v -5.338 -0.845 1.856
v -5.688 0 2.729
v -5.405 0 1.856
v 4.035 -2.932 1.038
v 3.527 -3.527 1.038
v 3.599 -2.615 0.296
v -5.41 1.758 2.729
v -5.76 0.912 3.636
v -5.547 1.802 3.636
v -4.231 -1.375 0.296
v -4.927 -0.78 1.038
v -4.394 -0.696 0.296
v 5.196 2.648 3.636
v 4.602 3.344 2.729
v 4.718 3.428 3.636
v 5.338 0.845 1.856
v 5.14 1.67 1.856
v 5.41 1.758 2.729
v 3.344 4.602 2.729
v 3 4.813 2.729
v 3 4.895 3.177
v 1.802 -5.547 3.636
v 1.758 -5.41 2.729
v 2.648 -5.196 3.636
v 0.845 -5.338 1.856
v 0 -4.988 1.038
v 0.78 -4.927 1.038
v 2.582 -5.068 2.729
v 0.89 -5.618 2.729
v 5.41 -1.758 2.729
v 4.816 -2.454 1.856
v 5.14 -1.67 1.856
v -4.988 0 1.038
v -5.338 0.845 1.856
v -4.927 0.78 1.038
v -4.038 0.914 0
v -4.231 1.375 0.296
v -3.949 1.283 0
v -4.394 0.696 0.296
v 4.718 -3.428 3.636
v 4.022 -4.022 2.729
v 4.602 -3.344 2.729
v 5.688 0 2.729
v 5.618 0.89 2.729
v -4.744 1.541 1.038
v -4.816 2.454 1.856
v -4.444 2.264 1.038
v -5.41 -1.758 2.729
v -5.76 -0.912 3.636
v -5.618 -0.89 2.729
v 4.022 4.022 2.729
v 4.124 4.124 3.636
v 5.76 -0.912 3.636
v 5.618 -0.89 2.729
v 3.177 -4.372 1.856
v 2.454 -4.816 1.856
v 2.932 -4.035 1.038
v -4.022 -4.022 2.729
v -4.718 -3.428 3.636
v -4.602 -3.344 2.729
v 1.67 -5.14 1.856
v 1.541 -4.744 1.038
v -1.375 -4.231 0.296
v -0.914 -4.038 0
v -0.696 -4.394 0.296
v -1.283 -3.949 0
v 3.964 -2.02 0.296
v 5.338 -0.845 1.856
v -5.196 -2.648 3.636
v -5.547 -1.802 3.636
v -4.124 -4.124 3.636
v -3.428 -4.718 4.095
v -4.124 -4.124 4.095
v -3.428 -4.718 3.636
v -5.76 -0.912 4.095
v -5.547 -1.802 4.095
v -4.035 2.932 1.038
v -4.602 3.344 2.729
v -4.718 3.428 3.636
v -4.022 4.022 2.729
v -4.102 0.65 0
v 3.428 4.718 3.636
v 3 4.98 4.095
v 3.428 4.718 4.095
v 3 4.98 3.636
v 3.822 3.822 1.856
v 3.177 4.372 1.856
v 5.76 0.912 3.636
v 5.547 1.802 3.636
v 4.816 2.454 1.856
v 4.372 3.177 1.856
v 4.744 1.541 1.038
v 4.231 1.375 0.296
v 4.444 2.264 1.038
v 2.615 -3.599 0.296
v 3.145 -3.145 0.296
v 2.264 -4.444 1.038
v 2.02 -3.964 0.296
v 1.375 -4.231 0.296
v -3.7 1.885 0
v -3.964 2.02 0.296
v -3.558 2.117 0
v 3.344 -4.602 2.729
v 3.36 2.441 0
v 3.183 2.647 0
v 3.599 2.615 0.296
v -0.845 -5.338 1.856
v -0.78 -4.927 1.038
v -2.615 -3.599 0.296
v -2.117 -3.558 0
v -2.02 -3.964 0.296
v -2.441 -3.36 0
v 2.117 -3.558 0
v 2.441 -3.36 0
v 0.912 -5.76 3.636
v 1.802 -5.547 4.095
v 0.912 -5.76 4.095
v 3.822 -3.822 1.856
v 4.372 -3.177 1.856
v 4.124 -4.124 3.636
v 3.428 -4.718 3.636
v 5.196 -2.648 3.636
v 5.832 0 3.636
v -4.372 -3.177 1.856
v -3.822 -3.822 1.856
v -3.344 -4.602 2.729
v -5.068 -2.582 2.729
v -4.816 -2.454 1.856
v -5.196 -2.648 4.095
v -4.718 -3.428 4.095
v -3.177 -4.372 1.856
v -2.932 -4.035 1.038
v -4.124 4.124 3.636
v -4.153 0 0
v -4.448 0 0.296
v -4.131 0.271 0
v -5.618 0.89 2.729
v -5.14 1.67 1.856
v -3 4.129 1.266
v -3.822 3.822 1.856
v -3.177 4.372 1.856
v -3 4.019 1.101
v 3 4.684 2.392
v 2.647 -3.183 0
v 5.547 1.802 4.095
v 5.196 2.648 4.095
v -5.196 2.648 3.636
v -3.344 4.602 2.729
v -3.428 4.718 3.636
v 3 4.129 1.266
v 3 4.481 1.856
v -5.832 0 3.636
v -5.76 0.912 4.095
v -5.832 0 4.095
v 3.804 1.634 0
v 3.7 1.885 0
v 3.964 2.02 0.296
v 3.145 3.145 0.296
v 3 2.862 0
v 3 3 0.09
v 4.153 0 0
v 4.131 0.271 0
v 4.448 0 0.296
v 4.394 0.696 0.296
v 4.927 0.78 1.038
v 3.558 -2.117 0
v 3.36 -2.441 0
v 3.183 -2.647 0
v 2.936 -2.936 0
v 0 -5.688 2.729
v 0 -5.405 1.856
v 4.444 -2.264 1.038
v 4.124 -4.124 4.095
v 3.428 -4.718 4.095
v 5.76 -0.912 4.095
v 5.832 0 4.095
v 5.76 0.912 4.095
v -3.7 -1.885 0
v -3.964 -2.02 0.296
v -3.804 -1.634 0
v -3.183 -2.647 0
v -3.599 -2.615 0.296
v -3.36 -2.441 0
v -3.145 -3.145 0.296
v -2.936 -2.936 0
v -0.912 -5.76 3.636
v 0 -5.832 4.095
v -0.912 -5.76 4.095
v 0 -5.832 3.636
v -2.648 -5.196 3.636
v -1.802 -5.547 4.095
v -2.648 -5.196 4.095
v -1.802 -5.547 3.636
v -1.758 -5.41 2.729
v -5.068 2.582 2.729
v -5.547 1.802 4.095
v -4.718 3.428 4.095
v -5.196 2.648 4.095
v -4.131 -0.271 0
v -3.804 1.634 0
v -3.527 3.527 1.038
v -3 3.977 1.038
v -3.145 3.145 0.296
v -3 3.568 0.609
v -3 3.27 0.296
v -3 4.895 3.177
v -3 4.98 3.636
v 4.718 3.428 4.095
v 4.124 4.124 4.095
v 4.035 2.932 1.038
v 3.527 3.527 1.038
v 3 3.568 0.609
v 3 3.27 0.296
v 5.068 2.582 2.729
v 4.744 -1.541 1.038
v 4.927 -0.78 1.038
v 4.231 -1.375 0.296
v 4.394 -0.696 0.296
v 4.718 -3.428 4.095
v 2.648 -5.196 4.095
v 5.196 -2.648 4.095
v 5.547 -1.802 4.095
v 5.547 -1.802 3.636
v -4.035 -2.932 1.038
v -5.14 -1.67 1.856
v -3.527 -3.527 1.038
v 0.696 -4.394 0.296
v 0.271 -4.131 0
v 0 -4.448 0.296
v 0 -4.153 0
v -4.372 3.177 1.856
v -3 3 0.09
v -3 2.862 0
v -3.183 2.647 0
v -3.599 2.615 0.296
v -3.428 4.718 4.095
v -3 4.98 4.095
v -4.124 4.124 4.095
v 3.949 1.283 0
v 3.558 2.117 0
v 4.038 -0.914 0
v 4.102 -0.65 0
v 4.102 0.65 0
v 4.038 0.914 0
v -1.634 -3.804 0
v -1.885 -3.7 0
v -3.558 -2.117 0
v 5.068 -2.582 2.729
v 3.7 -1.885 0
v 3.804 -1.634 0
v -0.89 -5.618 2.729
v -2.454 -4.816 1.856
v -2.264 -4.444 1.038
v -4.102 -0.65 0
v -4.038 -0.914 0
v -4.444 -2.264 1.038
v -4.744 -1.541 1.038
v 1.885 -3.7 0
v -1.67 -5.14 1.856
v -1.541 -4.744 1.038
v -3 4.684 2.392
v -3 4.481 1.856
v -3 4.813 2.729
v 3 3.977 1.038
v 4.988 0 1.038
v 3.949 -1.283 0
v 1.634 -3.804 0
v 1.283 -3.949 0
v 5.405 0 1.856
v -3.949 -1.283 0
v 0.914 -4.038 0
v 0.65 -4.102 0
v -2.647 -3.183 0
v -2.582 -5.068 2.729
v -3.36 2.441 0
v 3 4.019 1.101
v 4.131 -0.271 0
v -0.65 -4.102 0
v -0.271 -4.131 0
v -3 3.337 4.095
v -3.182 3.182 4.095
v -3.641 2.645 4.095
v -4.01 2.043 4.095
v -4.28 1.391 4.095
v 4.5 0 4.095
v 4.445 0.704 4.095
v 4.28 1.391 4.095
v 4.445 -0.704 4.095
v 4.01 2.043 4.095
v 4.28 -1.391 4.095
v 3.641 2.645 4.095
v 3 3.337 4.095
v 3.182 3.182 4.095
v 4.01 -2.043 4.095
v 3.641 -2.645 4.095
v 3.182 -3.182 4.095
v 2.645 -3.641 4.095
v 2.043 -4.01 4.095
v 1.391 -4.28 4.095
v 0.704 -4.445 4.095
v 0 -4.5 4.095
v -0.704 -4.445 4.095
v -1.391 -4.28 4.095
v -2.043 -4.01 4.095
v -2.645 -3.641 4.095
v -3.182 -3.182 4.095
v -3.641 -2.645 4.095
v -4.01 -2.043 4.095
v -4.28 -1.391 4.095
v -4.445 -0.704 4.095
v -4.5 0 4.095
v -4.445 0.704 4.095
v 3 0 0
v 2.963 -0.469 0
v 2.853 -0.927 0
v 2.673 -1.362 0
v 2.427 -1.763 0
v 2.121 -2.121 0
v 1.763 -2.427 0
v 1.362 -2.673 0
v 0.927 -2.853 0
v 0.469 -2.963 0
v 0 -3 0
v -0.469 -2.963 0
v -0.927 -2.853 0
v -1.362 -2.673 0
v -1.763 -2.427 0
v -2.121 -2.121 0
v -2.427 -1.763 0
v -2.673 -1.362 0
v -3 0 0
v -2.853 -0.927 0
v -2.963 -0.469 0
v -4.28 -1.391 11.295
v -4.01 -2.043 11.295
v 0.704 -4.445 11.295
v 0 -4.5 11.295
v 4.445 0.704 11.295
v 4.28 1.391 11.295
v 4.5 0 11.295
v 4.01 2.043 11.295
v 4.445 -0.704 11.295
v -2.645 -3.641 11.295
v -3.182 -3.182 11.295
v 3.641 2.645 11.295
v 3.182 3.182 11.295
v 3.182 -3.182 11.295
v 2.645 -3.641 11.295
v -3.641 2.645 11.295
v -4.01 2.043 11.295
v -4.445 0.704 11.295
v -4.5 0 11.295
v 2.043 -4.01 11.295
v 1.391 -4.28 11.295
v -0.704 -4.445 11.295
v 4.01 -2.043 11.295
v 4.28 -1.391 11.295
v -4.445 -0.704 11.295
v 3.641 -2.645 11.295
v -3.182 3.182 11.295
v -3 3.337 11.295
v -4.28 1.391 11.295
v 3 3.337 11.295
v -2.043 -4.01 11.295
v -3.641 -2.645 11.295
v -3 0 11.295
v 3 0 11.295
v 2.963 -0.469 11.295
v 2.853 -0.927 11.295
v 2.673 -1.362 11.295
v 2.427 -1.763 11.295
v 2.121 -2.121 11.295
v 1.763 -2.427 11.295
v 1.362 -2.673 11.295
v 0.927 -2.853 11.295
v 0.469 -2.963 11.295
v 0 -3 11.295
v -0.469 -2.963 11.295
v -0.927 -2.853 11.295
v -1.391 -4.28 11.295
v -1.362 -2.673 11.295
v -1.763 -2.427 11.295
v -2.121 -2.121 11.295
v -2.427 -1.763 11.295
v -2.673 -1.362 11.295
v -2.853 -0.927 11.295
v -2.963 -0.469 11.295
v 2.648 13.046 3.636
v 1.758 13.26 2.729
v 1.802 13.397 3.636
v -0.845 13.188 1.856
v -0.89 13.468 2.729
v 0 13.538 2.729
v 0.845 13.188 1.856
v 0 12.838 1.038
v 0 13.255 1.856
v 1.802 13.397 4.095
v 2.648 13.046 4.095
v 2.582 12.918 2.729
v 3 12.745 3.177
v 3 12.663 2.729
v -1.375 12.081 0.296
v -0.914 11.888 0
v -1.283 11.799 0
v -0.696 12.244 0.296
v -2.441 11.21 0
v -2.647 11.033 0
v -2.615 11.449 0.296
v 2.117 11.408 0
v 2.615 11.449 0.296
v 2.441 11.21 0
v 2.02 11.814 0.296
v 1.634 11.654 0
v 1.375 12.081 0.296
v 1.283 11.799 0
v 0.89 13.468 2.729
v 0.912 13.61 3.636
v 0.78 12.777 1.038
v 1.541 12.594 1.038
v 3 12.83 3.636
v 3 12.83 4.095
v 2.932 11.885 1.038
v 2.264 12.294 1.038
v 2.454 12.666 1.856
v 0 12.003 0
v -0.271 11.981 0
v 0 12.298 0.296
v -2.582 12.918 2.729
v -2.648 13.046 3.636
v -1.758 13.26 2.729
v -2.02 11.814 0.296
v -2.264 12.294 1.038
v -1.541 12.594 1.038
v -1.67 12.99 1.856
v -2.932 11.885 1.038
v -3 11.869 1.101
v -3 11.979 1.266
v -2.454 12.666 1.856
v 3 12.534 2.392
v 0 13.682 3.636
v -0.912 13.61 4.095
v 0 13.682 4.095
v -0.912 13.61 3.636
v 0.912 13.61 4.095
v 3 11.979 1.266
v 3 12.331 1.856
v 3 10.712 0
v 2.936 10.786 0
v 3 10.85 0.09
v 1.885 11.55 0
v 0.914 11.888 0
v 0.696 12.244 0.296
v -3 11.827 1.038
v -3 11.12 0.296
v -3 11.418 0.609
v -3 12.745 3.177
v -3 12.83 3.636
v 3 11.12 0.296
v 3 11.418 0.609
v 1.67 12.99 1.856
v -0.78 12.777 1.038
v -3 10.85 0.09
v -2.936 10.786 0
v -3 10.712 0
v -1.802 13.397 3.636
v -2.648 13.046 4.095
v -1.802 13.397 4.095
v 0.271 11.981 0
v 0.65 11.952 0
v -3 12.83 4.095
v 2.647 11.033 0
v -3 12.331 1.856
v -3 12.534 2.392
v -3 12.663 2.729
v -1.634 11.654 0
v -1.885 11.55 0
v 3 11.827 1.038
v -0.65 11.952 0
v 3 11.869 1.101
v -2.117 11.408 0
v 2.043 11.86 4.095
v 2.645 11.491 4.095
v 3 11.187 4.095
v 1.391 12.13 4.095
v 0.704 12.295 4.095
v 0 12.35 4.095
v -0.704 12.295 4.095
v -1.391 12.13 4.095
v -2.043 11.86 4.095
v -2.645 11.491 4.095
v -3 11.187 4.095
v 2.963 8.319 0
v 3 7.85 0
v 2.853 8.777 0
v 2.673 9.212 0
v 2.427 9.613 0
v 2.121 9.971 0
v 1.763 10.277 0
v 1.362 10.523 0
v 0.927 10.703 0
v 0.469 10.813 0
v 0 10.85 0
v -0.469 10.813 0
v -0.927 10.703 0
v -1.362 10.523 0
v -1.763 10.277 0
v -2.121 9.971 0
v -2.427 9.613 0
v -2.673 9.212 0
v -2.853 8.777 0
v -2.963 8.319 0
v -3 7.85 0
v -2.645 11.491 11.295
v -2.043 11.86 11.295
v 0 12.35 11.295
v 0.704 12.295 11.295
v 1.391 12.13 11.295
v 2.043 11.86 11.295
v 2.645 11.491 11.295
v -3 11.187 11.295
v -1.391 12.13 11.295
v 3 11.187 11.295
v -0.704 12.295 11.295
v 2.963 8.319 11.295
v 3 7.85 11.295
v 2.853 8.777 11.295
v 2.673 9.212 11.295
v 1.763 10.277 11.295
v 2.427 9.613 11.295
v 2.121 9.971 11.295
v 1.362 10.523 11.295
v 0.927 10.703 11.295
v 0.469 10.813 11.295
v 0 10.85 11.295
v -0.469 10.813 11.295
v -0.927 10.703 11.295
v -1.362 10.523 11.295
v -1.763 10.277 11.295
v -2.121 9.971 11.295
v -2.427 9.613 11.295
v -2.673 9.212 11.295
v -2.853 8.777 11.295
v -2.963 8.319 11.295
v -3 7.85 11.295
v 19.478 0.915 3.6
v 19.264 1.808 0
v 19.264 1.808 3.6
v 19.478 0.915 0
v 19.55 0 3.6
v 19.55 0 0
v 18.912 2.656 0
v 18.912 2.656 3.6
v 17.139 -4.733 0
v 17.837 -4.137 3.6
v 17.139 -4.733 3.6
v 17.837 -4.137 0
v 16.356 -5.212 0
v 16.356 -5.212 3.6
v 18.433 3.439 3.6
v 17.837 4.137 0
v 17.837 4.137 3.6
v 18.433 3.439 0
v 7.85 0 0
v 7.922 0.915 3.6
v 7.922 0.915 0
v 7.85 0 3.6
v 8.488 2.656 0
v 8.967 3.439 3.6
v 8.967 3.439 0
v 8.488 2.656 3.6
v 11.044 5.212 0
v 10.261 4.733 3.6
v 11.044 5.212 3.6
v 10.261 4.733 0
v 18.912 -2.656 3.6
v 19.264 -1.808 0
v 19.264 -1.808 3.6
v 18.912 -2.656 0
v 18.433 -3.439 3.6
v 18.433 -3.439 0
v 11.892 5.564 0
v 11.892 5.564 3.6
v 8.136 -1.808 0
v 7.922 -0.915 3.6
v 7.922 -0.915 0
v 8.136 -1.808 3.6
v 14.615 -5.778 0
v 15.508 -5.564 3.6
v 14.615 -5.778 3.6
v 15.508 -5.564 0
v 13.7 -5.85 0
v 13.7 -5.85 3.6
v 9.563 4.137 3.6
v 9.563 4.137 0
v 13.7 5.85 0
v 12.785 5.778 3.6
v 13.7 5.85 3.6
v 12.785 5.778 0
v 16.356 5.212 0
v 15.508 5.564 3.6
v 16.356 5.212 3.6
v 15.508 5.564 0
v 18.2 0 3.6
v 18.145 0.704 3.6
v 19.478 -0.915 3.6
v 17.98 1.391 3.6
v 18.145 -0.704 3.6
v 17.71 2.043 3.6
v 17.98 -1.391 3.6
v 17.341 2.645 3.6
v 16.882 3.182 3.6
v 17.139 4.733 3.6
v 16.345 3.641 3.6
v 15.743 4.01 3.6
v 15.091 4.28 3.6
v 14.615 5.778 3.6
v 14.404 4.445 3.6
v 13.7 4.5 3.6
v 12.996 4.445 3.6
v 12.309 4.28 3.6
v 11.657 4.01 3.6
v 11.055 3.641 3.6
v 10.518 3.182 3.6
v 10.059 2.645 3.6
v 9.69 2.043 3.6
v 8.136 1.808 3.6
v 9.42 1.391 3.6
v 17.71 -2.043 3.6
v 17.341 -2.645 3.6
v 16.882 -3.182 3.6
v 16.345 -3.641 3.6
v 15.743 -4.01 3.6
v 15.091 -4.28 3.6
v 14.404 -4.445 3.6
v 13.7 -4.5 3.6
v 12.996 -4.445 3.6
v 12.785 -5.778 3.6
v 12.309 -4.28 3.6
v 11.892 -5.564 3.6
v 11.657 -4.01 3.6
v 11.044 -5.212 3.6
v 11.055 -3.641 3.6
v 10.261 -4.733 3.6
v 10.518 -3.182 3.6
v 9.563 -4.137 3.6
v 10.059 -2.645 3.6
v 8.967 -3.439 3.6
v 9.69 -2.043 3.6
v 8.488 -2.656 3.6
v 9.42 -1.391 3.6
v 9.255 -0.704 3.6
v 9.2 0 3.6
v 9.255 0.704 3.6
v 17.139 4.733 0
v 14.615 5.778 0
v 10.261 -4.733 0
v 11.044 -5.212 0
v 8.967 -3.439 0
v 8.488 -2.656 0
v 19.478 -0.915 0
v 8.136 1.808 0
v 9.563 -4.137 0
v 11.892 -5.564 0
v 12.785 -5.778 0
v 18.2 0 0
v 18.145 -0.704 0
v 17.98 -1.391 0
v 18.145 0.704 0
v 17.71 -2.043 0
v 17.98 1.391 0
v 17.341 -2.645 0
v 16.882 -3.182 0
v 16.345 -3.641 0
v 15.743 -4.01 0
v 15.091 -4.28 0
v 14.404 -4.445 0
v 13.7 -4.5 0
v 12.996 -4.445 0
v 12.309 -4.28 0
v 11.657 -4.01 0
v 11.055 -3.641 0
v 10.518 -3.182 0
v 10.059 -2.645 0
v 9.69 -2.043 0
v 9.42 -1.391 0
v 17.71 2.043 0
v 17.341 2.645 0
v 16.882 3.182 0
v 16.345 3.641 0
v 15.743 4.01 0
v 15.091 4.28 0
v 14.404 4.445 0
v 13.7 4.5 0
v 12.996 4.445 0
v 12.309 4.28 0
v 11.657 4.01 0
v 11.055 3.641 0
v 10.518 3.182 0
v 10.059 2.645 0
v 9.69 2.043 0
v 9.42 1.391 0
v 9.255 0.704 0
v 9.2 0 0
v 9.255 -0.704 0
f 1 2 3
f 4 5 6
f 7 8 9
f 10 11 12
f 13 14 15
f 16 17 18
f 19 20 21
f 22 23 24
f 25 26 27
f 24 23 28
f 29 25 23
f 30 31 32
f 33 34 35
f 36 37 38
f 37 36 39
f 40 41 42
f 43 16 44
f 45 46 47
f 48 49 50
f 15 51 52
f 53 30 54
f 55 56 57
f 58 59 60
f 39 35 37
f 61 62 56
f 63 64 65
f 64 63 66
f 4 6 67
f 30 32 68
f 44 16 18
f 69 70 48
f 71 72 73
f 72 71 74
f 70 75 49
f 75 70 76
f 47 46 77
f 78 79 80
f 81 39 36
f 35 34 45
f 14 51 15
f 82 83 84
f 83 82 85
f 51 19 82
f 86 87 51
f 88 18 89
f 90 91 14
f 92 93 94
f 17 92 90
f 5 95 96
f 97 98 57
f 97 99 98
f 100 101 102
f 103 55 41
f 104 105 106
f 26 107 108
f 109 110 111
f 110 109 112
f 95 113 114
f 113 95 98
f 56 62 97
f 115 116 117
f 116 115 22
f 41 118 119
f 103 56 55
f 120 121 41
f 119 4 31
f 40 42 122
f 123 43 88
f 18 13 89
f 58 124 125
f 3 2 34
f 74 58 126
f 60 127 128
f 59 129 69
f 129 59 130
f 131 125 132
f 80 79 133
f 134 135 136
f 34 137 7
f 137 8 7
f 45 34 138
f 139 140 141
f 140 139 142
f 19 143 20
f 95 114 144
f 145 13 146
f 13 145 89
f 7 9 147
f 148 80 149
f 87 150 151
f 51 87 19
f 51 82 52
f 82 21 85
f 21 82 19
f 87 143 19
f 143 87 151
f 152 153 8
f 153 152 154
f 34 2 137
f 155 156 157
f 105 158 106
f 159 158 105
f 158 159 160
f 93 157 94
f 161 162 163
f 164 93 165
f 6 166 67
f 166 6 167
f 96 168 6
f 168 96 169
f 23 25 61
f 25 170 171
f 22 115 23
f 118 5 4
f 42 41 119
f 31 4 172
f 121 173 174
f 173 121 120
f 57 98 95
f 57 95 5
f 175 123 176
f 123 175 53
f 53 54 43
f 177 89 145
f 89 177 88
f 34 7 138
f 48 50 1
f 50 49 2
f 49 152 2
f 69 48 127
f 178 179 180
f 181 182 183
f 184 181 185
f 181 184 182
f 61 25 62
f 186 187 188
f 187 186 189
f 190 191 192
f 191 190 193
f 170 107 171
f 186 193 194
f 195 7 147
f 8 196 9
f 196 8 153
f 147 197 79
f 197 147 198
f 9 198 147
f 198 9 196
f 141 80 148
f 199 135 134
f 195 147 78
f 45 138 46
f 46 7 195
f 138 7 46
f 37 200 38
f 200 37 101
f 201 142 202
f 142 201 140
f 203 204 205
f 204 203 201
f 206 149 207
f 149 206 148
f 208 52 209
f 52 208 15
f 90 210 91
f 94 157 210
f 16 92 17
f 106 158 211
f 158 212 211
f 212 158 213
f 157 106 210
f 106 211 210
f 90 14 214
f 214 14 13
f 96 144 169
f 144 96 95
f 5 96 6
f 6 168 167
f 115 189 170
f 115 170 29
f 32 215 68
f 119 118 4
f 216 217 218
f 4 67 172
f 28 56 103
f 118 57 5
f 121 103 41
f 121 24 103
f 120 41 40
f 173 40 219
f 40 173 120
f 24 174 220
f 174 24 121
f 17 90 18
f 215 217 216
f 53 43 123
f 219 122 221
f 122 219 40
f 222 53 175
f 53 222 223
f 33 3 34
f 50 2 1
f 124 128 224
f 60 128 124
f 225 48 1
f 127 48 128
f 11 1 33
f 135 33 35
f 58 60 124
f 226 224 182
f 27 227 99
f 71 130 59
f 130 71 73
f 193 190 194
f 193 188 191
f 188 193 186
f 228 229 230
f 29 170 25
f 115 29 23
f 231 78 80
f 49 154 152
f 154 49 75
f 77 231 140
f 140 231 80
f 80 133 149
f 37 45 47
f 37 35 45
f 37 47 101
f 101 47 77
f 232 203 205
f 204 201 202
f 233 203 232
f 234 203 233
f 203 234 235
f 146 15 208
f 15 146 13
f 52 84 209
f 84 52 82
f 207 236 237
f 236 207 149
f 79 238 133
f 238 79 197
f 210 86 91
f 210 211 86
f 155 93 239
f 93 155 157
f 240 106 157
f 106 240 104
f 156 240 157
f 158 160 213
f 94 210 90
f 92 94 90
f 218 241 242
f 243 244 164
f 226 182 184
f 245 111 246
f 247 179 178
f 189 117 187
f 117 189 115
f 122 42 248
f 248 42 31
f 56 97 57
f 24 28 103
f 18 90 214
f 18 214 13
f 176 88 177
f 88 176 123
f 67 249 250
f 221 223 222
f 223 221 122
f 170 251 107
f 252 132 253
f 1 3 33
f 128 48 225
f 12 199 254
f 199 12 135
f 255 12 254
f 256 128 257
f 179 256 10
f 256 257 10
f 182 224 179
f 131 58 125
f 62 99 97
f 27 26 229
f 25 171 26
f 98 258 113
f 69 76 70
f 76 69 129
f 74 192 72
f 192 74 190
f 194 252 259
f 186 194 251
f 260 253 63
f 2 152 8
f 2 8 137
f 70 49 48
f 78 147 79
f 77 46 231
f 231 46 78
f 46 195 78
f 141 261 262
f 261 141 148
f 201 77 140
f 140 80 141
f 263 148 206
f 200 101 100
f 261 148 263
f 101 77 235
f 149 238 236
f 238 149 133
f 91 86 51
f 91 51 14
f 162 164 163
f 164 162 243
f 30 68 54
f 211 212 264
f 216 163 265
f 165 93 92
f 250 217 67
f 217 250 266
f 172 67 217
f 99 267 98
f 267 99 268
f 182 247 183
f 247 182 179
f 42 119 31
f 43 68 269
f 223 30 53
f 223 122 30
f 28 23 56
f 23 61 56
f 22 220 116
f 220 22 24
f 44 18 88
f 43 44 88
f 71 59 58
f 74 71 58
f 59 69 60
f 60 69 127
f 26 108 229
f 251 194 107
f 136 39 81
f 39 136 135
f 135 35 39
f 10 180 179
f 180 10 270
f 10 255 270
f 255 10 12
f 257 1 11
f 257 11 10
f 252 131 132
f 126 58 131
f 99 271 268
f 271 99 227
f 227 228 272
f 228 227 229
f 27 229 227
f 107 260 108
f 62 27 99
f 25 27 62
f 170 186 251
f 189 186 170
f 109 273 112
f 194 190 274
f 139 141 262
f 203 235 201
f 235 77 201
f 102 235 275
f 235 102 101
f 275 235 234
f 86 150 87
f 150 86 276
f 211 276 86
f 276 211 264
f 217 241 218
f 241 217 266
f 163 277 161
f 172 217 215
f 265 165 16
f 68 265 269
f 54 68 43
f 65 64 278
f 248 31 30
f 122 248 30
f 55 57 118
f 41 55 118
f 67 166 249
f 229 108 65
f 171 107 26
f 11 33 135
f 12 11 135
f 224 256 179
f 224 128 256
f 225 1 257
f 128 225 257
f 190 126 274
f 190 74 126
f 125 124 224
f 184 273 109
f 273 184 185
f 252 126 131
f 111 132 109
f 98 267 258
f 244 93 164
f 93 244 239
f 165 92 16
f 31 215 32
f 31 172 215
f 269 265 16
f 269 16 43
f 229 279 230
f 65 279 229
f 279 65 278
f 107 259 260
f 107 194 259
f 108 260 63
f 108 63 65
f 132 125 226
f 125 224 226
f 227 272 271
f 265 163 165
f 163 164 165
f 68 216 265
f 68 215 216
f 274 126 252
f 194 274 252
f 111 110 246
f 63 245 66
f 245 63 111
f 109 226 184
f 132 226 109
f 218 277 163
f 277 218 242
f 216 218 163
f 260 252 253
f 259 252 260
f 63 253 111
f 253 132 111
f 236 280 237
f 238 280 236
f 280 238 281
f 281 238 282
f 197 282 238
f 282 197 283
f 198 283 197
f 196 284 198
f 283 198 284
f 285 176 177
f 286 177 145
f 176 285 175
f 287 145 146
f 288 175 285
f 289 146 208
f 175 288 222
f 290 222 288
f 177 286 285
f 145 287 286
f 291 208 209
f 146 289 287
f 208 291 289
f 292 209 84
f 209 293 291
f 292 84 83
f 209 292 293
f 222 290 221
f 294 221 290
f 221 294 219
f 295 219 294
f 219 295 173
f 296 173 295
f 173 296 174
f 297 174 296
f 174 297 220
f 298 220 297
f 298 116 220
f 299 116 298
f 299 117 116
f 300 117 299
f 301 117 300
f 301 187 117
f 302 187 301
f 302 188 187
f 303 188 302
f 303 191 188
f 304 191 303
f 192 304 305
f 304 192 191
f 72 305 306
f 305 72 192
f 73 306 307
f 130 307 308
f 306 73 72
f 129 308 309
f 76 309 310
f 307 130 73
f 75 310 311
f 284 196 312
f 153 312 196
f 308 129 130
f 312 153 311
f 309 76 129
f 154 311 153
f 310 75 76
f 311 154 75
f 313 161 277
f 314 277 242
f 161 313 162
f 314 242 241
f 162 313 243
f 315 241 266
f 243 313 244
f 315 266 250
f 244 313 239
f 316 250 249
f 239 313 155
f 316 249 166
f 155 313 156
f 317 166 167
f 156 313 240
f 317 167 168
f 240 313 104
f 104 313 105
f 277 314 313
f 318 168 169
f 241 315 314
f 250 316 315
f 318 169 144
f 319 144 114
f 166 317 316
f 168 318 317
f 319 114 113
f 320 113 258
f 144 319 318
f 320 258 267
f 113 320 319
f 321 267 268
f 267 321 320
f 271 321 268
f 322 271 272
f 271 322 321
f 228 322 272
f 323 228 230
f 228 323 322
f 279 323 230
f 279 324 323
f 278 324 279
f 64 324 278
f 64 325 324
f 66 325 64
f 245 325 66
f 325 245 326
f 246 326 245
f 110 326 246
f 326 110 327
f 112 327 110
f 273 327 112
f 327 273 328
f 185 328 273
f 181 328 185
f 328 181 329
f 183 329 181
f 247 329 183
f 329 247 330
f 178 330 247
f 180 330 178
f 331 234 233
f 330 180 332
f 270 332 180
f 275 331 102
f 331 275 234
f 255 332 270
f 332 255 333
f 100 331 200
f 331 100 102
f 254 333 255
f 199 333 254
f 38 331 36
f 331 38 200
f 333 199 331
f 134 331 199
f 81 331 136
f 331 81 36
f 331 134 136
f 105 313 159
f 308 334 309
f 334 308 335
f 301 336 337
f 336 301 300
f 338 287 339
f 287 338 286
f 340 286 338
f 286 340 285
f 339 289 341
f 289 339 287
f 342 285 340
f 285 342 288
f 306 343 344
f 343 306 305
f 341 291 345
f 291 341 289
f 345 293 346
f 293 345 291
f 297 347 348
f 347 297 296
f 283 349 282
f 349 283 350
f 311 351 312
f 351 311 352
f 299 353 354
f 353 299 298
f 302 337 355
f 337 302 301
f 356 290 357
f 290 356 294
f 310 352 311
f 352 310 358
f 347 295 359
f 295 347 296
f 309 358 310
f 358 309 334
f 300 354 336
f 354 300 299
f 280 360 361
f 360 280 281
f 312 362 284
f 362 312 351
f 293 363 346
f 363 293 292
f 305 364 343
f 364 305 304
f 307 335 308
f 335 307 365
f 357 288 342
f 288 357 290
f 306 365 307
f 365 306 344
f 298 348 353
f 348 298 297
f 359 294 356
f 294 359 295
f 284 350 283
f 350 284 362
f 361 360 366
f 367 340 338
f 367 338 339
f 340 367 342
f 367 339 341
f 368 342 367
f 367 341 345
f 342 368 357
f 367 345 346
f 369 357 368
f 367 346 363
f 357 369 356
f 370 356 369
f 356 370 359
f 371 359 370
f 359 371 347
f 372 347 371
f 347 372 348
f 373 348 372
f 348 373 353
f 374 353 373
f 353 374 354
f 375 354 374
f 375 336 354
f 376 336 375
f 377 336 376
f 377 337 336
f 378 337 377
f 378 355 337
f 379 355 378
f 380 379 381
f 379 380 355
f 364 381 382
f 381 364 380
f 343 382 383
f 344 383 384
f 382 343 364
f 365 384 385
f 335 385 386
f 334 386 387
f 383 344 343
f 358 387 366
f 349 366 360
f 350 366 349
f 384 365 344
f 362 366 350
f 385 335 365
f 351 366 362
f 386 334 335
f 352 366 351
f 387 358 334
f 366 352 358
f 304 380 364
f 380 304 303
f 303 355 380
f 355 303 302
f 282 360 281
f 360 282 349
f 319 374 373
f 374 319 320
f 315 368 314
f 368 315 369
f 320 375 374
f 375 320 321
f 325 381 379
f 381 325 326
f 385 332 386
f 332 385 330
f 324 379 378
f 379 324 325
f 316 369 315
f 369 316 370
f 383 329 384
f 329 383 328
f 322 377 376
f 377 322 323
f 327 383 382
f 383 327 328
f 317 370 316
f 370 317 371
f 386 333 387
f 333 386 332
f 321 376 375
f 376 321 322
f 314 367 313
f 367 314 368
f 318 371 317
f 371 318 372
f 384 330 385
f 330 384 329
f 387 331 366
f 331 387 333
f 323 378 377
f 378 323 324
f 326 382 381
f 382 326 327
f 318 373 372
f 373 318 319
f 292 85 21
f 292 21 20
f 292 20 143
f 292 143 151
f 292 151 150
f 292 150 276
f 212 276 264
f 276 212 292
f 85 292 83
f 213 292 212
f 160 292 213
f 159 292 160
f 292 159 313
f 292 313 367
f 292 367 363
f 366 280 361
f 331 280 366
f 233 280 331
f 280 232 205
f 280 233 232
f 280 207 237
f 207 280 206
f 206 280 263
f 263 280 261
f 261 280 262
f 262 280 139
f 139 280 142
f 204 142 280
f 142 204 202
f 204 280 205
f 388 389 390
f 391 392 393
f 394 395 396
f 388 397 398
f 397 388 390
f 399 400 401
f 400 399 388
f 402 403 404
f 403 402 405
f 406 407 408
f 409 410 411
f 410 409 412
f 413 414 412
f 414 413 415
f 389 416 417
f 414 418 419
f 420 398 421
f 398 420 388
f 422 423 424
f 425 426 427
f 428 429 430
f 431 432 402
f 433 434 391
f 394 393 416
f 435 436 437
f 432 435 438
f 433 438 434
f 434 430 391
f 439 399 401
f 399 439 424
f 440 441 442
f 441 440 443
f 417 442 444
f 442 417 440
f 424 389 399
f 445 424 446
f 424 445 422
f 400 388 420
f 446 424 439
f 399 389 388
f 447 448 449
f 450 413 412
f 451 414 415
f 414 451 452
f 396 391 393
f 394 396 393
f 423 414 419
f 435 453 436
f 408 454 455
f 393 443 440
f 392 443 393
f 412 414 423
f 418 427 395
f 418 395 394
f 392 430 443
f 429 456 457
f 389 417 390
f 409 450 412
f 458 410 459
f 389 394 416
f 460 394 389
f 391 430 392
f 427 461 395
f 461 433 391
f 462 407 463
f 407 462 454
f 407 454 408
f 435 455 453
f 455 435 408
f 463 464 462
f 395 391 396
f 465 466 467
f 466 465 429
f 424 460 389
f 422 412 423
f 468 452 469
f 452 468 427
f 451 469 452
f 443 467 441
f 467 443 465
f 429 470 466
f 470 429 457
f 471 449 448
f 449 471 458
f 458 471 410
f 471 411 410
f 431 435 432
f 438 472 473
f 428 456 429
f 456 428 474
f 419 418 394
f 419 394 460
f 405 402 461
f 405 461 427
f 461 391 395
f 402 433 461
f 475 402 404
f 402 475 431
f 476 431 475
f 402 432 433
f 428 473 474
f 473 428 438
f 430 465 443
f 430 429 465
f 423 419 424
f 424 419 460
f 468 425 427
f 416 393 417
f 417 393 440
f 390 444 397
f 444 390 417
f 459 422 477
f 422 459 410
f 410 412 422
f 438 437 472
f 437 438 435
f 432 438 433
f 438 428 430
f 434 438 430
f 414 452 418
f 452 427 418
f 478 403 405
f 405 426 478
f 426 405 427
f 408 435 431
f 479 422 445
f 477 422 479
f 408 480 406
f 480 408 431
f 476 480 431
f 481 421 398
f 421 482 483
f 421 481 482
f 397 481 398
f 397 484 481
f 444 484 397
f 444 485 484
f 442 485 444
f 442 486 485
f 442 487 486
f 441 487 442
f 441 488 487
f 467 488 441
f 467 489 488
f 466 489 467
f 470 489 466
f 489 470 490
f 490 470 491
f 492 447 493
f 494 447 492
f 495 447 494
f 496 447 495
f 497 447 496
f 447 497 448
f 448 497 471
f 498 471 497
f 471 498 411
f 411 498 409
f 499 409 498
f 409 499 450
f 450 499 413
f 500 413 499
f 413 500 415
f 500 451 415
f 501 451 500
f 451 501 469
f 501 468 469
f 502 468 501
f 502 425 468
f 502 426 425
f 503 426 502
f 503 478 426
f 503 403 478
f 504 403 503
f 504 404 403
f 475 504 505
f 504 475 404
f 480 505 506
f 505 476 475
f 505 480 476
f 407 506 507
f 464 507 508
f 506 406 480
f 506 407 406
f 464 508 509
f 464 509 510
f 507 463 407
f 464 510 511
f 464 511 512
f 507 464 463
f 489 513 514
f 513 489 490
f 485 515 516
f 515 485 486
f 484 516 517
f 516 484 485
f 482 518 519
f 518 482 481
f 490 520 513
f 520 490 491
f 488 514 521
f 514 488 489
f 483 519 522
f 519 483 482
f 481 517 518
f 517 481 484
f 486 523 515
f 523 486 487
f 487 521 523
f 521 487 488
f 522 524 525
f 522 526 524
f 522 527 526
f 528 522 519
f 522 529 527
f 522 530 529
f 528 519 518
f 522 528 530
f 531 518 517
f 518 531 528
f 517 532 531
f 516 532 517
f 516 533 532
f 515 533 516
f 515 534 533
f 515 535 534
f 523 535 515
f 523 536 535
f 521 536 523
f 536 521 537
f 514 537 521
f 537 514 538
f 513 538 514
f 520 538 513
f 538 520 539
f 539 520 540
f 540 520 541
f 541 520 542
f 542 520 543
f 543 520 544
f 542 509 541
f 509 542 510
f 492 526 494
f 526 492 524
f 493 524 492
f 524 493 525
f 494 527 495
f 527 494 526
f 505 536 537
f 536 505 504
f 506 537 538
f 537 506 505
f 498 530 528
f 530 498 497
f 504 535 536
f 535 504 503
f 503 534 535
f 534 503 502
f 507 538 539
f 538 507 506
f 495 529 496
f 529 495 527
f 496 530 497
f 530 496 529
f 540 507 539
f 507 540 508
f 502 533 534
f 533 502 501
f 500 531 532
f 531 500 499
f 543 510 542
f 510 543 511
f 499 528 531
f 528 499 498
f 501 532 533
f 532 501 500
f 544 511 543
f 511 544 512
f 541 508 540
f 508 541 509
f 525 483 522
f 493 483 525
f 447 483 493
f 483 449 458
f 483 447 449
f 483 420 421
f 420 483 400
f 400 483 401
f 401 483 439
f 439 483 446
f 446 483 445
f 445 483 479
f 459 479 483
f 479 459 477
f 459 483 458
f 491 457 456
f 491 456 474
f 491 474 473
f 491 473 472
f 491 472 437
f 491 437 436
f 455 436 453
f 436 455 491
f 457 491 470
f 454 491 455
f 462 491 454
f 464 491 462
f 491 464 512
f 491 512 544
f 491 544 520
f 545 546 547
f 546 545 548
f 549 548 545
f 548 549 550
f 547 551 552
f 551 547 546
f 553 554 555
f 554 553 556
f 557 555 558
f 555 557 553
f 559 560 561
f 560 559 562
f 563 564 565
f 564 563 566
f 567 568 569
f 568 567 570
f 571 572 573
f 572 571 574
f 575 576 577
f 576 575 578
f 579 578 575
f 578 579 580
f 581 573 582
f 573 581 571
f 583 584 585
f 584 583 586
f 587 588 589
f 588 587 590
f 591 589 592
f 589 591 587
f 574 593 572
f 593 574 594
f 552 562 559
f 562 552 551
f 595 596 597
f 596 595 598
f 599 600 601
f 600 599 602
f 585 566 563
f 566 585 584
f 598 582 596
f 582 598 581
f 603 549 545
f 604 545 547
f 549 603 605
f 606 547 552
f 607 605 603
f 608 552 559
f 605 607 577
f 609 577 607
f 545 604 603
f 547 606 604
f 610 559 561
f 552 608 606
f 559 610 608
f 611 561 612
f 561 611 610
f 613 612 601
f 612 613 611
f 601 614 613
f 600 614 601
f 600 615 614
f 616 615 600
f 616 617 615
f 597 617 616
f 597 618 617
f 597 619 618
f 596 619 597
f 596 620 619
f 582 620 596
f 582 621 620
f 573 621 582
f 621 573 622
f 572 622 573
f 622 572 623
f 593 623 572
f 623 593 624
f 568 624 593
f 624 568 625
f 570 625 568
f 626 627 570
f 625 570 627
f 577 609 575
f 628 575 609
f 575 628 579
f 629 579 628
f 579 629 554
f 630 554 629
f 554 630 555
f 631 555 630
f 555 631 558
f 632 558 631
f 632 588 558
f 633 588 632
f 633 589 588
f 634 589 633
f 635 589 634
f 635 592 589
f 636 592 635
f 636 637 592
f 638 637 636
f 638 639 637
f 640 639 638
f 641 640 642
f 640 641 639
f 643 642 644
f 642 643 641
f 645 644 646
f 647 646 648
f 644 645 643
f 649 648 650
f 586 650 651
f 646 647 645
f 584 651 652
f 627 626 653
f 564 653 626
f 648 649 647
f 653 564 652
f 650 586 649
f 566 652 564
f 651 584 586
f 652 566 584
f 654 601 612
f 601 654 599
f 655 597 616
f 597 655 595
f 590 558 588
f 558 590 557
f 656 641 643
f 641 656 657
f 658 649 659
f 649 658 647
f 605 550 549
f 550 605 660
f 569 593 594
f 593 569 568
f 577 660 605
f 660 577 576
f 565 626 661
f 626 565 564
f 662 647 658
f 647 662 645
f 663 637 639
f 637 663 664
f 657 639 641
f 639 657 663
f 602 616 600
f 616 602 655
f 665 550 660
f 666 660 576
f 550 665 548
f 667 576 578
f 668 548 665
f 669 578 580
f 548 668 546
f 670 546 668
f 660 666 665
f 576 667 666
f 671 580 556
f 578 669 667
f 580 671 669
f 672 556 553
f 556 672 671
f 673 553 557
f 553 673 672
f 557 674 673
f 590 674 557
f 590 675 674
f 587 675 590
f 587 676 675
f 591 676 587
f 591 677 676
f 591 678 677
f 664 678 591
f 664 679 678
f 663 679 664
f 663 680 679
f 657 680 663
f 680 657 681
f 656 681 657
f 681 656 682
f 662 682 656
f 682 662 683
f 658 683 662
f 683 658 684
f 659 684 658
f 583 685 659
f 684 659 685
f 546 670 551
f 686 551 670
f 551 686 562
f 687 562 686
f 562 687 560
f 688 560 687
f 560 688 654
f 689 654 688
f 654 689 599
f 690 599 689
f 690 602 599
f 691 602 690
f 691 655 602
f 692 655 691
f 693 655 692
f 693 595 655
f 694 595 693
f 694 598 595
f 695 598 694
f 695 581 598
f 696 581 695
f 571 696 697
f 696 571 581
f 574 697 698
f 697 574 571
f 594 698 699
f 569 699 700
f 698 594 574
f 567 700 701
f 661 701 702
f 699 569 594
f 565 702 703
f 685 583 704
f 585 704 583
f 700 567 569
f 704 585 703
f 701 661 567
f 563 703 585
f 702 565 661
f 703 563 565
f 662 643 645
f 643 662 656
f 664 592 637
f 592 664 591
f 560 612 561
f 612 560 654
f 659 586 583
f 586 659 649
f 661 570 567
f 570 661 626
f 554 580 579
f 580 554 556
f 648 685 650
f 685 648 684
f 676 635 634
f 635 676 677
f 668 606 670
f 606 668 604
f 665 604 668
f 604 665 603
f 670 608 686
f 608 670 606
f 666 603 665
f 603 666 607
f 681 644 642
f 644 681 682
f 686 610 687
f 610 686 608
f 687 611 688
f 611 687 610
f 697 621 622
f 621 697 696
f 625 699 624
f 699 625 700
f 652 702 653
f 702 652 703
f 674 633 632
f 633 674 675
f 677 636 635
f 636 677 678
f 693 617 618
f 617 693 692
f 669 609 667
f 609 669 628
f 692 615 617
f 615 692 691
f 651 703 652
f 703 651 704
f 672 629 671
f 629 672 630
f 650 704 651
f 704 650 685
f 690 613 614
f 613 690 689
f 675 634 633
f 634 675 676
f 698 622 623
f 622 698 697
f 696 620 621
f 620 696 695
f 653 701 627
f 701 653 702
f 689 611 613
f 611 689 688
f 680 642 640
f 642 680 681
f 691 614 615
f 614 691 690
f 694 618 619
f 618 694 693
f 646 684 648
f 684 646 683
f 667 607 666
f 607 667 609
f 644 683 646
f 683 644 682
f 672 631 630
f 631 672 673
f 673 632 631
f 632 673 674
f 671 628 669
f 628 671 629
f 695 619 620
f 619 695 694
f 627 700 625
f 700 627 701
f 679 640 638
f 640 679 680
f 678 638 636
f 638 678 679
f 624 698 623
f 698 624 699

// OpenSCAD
od=9;
id=6;
ll=od*0.8;
hd=od*1.3;
hb=ll*0.6;
cl=ll*0.5;

hh=hd*0.35 /* 0.1 to 0.4 */;

$fn=40;

module gland()difference(){
    union(){
        intersection(){
            translate([0,0,hh])sphere(d=hd);
            translate([-hd/2,-hd/2,0])cube([hd,hd,hh],false);
        }
        translate([0,0,hh])cylinder(ll,d=od);
    }
    translate([0,0,-1])cylinder(ll+hd,d=id);
}

module cut()translate([-id/2,0,-1])cube([id,hd*0.6,ll+hd]);

difference(){
    gland();
    cut();
}

translate([0,hd/2+2,0])intersection(){
    gland();
    cut();
}

translate([hd+2,0,0]){
    difference(){
        cylinder(cl,d=hd);
        translate([0,0,-1])cylinder(cl*2,d=od);
    }
}
